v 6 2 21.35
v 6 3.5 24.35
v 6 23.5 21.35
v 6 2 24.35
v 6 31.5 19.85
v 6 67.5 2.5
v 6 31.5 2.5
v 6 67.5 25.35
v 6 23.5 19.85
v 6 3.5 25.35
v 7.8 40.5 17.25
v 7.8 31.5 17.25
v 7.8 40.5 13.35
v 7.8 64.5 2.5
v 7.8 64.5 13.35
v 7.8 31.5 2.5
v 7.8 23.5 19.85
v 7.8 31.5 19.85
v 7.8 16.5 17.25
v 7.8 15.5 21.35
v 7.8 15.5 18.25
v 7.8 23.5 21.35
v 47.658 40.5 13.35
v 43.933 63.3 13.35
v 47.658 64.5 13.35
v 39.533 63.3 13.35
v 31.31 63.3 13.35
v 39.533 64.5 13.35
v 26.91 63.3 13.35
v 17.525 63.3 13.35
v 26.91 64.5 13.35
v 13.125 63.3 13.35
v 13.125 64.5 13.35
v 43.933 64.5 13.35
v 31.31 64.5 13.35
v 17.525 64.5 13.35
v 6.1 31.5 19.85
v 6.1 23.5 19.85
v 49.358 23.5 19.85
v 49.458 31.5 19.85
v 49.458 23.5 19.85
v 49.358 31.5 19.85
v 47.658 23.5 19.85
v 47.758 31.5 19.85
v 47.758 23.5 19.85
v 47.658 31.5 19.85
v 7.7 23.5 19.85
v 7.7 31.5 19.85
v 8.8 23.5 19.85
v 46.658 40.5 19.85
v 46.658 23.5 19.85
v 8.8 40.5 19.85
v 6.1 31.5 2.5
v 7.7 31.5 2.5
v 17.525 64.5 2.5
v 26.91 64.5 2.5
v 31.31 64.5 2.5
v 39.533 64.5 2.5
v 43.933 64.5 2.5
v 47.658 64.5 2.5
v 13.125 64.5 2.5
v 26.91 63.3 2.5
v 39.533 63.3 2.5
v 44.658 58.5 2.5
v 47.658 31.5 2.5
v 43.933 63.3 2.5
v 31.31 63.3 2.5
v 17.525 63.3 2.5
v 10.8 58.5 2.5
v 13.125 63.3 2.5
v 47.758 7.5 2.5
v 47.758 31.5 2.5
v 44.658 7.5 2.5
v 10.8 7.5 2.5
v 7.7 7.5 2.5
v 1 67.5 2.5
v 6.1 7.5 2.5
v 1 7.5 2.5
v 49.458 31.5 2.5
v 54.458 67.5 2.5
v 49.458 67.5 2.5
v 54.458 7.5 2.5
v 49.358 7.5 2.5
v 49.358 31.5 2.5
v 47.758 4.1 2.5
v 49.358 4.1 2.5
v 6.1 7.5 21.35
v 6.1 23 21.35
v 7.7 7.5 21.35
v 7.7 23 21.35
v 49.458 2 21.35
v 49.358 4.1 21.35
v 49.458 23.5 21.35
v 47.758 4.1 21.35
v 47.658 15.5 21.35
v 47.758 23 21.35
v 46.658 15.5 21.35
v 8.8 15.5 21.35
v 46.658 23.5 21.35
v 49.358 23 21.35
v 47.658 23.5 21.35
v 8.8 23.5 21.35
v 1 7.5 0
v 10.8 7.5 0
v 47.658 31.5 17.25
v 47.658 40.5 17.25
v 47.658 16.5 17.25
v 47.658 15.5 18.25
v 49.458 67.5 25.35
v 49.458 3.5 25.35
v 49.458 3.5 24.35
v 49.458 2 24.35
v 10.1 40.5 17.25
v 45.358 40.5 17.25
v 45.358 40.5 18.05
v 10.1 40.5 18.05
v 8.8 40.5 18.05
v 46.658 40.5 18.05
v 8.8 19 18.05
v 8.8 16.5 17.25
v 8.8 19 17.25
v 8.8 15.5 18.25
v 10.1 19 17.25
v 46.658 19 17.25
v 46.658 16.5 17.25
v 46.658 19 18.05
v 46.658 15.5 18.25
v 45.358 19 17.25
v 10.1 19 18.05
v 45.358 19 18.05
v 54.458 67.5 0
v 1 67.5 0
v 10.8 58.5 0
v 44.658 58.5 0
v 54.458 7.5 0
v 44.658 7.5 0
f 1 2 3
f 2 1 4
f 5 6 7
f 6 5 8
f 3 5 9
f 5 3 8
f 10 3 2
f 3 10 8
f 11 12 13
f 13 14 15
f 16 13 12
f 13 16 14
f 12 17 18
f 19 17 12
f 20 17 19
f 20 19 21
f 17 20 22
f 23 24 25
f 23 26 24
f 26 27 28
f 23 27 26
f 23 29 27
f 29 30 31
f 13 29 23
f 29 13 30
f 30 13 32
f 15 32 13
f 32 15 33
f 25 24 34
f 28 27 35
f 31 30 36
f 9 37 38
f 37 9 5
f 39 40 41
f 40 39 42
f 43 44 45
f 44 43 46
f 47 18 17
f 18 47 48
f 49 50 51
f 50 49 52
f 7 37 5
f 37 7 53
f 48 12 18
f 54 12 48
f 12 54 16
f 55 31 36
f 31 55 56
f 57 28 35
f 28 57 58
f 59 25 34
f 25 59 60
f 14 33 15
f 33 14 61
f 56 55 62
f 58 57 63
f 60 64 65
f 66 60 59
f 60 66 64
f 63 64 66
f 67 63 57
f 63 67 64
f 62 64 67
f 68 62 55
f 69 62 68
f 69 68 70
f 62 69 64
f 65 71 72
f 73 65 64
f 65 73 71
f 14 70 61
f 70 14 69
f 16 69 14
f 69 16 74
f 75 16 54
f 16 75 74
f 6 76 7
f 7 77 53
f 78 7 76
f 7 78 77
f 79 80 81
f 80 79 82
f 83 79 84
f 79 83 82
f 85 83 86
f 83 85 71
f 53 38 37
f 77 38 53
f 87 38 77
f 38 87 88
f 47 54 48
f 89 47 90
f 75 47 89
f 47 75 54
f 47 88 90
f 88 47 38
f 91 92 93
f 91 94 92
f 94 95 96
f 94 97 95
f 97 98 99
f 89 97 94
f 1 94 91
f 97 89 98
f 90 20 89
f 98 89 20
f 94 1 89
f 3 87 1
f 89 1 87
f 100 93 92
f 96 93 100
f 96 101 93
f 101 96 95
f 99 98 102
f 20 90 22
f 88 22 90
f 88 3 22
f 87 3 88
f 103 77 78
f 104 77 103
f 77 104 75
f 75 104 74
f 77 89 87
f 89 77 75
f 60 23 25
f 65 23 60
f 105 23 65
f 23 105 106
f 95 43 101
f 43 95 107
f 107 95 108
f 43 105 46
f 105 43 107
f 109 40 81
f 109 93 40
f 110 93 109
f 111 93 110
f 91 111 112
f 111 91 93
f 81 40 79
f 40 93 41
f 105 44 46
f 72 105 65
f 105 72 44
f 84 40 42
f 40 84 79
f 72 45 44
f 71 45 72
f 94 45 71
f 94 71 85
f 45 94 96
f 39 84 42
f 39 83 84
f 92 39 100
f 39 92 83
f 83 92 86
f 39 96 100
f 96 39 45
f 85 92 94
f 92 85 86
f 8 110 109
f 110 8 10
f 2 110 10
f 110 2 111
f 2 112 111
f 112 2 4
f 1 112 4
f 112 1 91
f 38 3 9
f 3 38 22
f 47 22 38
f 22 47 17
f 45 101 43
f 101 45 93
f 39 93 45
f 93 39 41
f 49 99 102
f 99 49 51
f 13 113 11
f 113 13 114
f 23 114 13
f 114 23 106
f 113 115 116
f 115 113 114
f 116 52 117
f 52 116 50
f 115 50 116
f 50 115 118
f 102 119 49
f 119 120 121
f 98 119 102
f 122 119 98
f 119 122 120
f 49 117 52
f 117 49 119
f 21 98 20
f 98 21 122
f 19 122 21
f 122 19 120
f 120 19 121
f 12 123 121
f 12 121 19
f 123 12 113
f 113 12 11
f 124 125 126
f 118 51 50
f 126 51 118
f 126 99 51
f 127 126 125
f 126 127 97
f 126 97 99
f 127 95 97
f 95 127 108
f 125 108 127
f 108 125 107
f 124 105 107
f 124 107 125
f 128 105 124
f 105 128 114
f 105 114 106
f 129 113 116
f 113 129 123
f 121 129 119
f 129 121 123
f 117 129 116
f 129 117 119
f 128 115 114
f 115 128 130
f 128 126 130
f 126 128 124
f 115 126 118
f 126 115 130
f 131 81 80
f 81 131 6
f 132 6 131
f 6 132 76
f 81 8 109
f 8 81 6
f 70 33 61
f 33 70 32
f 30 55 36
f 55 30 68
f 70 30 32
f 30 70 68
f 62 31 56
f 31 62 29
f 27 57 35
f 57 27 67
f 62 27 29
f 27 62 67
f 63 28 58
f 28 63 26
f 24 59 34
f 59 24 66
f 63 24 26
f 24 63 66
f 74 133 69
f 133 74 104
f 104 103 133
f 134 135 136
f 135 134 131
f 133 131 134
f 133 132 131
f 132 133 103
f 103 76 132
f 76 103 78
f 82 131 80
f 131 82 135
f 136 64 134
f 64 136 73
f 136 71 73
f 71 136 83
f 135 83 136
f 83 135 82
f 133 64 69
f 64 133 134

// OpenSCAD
// Toccata stage-0 C11a - 윗판 브리지 출력 쿠폰 (핀 사이 39.86, 모델 프레임 그대로 z50 위) (generated by make_stage0.py; print orientation, z = build direction)
$fn = 64;
union(){
intersection(){translate([6.0000,0,0]) rotate([90,0,90]) linear_extrude(height=1.8000) polygon([[31.5000,-42.5000],[64.5000,-42.5000],[64.5000,13.3500],[64.0000,13.3500],[63.5000,13.3500],[63.0000,13.3500],[62.5000,13.3500],[62.0000,13.3500],[61.5000,13.3500],[61.0000,13.3500],[60.5000,13.3500],[60.0000,13.3500],[59.5000,13.3500],[59.0000,13.3500],[58.5000,13.3500],[58.0000,13.3500],[57.5000,13.3500],[57.0000,13.3500],[56.5000,13.3500],[56.0000,13.3500],[55.5000,13.3500],[55.0000,13.3500],[54.5000,13.3500],[54.0000,13.3500],[53.5000,13.3500],[53.0000,13.3500],[52.5000,13.3500],[52.0000,13.3500],[51.5000,13.3500],[51.0000,13.3500],[50.5000,13.3500],[50.0000,13.3500],[49.5000,13.3500],[49.0000,13.3500],[48.5000,13.3500],[48.0000,13.3500],[47.5000,13.3500],[47.0000,13.3500],[46.5000,13.3500],[46.0000,13.3500],[45.5000,13.3500],[45.0000,13.3500],[44.5000,13.3500],[44.0000,13.3500],[43.5000,13.3500],[43.0000,13.3500],[42.5000,13.3500],[42.0000,13.3500],[41.5000,13.3500],[41.0000,13.3500],[40.5000,19.8500],[40.0000,19.8500],[39.5000,19.8500],[39.0000,19.8500],[38.5000,19.8500],[38.0000,19.8500],[37.5000,19.8500],[37.0000,19.8500],[36.5000,19.8500],[36.0000,19.8500],[35.5000,19.8500],[35.0000,19.8500],[34.5000,19.8500],[34.0000,19.8500],[33.5000,19.8500],[33.0000,19.8500],[32.5000,19.8500],[32.0000,19.8500],[31.5000,19.8500]]); translate([-10,-10,2.5000]) cube([400,400,200]);}
intersection(){translate([6.1000,0,0]) rotate([90,0,90]) linear_extrude(height=1.6000) polygon([[7.5000,-42.5000],[31.5000,-42.5000],[31.5000,19.8500],[31.0000,19.8500],[30.5000,19.8500],[30.0000,19.8500],[29.5000,19.8500],[29.0000,19.8500],[28.5000,19.8500],[28.0000,19.8500],[27.5000,19.8500],[27.0000,19.8500],[26.5000,19.8500],[26.0000,19.8500],[25.5000,19.8500],[25.0000,19.8500],[24.5000,19.8500],[24.0000,19.8500],[23.5000,19.8500],[23.0000,21.3500],[22.5000,21.3500],[22.0000,21.3500],[21.5000,21.3500],[21.0000,21.3500],[20.5000,21.3500],[20.0000,21.3500],[19.5000,21.3500],[19.0000,21.3500],[18.5000,21.3500],[18.0000,21.3500],[17.5000,21.3500],[17.0000,21.3500],[16.5000,21.3500],[16.0000,21.3500],[15.5000,21.3500],[15.0000,21.3500],[14.5000,21.3500],[14.0000,21.3500],[13.5000,21.3500],[13.0000,21.3500],[12.5000,21.3500],[12.0000,21.3500],[11.5000,21.3500],[11.0000,21.3500],[10.5000,21.3500],[10.0000,21.3500],[9.5000,21.3500],[9.0000,21.3500],[8.5000,21.3500],[8.0000,21.3500],[7.5000,21.3500]]); translate([-10,-10,2.5000]) cube([400,400,200]);}
intersection(){translate([47.6580,0,0]) rotate([90,0,90]) linear_extrude(height=1.8000) polygon([[31.5000,-26.0000],[64.5000,-26.0000],[64.5000,13.3500],[64.0000,13.3500],[63.5000,13.3500],[63.0000,13.3500],[62.5000,13.3500],[62.0000,13.3500],[61.5000,13.3500],[61.0000,13.3500],[60.5000,13.3500],[60.0000,13.3500],[59.5000,13.3500],[59.0000,13.3500],[58.5000,13.3500],[58.0000,13.3500],[57.5000,13.3500],[57.0000,13.3500],[56.5000,13.3500],[56.0000,13.3500],[55.5000,13.3500],[55.0000,13.3500],[54.5000,13.3500],[54.0000,13.3500],[53.5000,13.3500],[53.0000,13.3500],[52.5000,13.3500],[52.0000,13.3500],[51.5000,13.3500],[51.0000,13.3500],[50.5000,13.3500],[50.0000,13.3500],[49.5000,13.3500],[49.0000,13.3500],[48.5000,13.3500],[48.0000,13.3500],[47.5000,13.3500],[47.0000,13.3500],[46.5000,13.3500],[46.0000,13.3500],[45.5000,13.3500],[45.0000,13.3500],[44.5000,13.3500],[44.0000,13.3500],[43.5000,13.3500],[43.0000,13.3500],[42.5000,13.3500],[42.0000,13.3500],[41.5000,13.3500],[41.0000,13.3500],[40.5000,19.8500],[40.0000,19.8500],[39.5000,19.8500],[39.0000,19.8500],[38.5000,19.8500],[38.0000,19.8500],[37.5000,19.8500],[37.0000,19.8500],[36.5000,19.8500],[36.0000,19.8500],[35.5000,19.8500],[35.0000,19.8500],[34.5000,19.8500],[34.0000,19.8500],[33.5000,19.8500],[33.0000,19.8500],[32.5000,19.8500],[32.0000,19.8500],[31.5000,19.8500]]); translate([-10,-10,2.5000]) cube([400,400,200]);}
intersection(){translate([47.7580,0,0]) rotate([90,0,90]) linear_extrude(height=1.6000) polygon([[4.1000,-44.5000],[26.2000,-44.5000],[26.2000,-26.0000],[31.5000,-26.0000],[31.5000,19.8500],[31.0000,19.8500],[30.5000,19.8500],[30.0000,19.8500],[29.5000,19.8500],[29.0000,19.8500],[28.5000,19.8500],[28.0000,19.8500],[27.5000,19.8500],[27.0000,19.8500],[26.5000,19.8500],[26.0000,19.8500],[25.5000,19.8500],[25.0000,19.8500],[24.5000,19.8500],[24.0000,19.8500],[23.5000,19.8500],[23.0000,21.3500],[22.5000,21.3500],[22.0000,21.3500],[21.5000,21.3500],[21.0000,21.3500],[20.5000,21.3500],[20.0000,21.3500],[19.5000,21.3500],[19.0000,21.3500],[18.5000,21.3500],[18.0000,21.3500],[17.5000,21.3500],[17.0000,21.3500],[16.5000,21.3500],[16.0000,21.3500],[15.5000,21.3500],[15.0000,21.3500],[14.5000,21.3500],[14.0000,21.3500],[13.5000,21.3500],[13.0000,21.3500],[12.5000,21.3500],[12.0000,21.3500],[11.5000,21.3500],[11.0000,21.3500],[10.5000,21.3500],[10.0000,21.3500],[9.5000,21.3500],[9.0000,21.3500],[8.5000,21.3500],[8.0000,21.3500],[7.5000,21.3500],[7.0000,21.3500],[6.5000,21.3500],[6.0000,21.3500],[5.5000,21.3500],[5.0000,21.3500],[4.5000,21.3500],[4.1000,21.3500]]); translate([-10,-10,2.5000]) cube([400,400,200]);}
intersection(){translate([6.0000,0,0]) rotate([90,0,90]) linear_extrude(height=43.4580) polygon([[2.0000,21.3500],[2.0000,24.3500],[3.5000,24.3500],[3.5000,25.3500],[64.5000,25.3500],[64.5000,13.3500],[64.0000,13.3500],[63.5000,13.3500],[63.0000,13.3500],[62.5000,13.3500],[62.0000,13.3500],[61.5000,13.3500],[61.0000,13.3500],[60.5000,13.3500],[60.0000,13.3500],[59.5000,13.3500],[59.0000,13.3500],[58.5000,13.3500],[58.0000,13.3500],[57.5000,13.3500],[57.0000,13.3500],[56.5000,13.3500],[56.0000,13.3500],[55.5000,13.3500],[55.0000,13.3500],[54.5000,13.3500],[54.0000,13.3500],[53.5000,13.3500],[53.0000,13.3500],[52.5000,13.3500],[52.0000,13.3500],[51.5000,13.3500],[51.0000,13.3500],[50.5000,13.3500],[50.0000,13.3500],[49.5000,13.3500],[49.0000,13.3500],[48.5000,13.3500],[48.0000,13.3500],[47.5000,13.3500],[47.0000,13.3500],[46.5000,13.3500],[46.0000,13.3500],[45.5000,13.3500],[45.0000,13.3500],[44.5000,13.3500],[44.0000,13.3500],[43.5000,13.3500],[43.0000,13.3500],[42.5000,13.3500],[42.0000,13.3500],[41.5000,13.3500],[41.0000,13.3500],[40.5000,13.3500],[40.5000,19.8500],[40.0000,19.8500],[39.5000,19.8500],[39.0000,19.8500],[38.5000,19.8500],[38.0000,19.8500],[37.5000,19.8500],[37.0000,19.8500],[36.5000,19.8500],[36.0000,19.8500],[35.5000,19.8500],[35.0000,19.8500],[34.5000,19.8500],[34.0000,19.8500],[33.5000,19.8500],[33.0000,19.8500],[32.5000,19.8500],[32.0000,19.8500],[31.5000,19.8500],[31.0000,19.8500],[30.5000,19.8500],[30.0000,19.8500],[29.5000,19.8500],[29.0000,19.8500],[28.5000,19.8500],[28.0000,19.8500],[27.5000,19.8500],[27.0000,19.8500],[26.5000,19.8500],[26.0000,19.8500],[25.5000,19.8500],[25.0000,19.8500],[24.5000,19.8500],[24.0000,19.8500],[23.5000,19.8500],[23.5000,21.3500],[23.0000,21.3500],[22.5000,21.3500],[22.0000,21.3500],[21.5000,21.3500],[21.0000,21.3500],[20.5000,21.3500],[20.0000,21.3500],[19.5000,21.3500],[19.0000,21.3500],[18.5000,21.3500],[18.0000,21.3500],[17.5000,21.3500],[17.0000,21.3500],[16.5000,21.3500],[16.0000,21.3500],[15.5000,21.3500],[15.0000,21.3500],[14.5000,21.3500],[14.0000,21.3500],[13.5000,21.3500],[13.0000,21.3500],[12.5000,21.3500],[12.0000,21.3500],[11.5000,21.3500],[11.0000,21.3500],[10.5000,21.3500],[10.0000,21.3500],[9.5000,21.3500],[9.0000,21.3500],[8.5000,21.3500],[8.0000,21.3500],[7.5000,21.3500],[7.0000,21.3500],[6.5000,21.3500],[6.0000,21.3500],[5.5000,21.3500],[5.0000,21.3500],[4.5000,21.3500],[4.0000,21.3500],[3.5000,21.3500],[3.0000,21.3500],[2.5000,21.3500],[2.0000,21.3500]]); translate([-10,-10,2.5000]) cube([400,400,200]);}
intersection(){translate([7.8000,0,0]) rotate([90,0,90]) linear_extrude(height=1.0000) polygon([[16.5000,17.2500],[40.5000,17.2500],[40.5000,19.8500],[23.5000,19.8500],[23.5000,21.3500],[15.5000,21.3500],[15.5000,18.2500]]); translate([-10,-10,2.5000]) cube([400,400,200]);}
intersection(){translate([46.6580,0,0]) rotate([90,0,90]) linear_extrude(height=1.0000) polygon([[16.5000,17.2500],[40.5000,17.2500],[40.5000,19.8500],[23.5000,19.8500],[23.5000,21.3500],[15.5000,21.3500],[15.5000,18.2500]]); translate([-10,-10,2.5000]) cube([400,400,200]);}
intersection(){translate([8.8000,0,0]) rotate([90,0,90]) linear_extrude(height=1.3000) polygon([[19.0000,17.2500],[40.5000,17.2500],[40.5000,18.0500],[19.0000,18.0500]]); translate([-10,-10,2.5000]) cube([400,400,200]);}
intersection(){translate([45.3580,0,0]) rotate([90,0,90]) linear_extrude(height=1.3000) polygon([[19.0000,17.2500],[40.5000,17.2500],[40.5000,18.0500],[19.0000,18.0500]]); translate([-10,-10,2.5000]) cube([400,400,200]);}
intersection(){translate([6.0000,0,0]) rotate([90,0,90]) linear_extrude(height=33.2400) polygon([[64.5000,-42.5000],[67.5000,-42.5000],[67.5000,25.3500],[64.5000,25.3500]]); translate([-10,-10,2.5000]) cube([400,400,200]);}
intersection(){translate([39.2400,0,0]) rotate([90,0,90]) linear_extrude(height=10.2180) polygon([[64.5000,-26.5000],[67.5000,-26.5000],[67.5000,25.3500],[64.5000,25.3500]]); translate([-10,-10,2.5000]) cube([400,400,200]);}
intersection(){translate([13.1250,0,0]) rotate([90,0,90]) linear_extrude(height=4.4000) polygon([[63.3000,-0.5000],[64.5000,-0.5000],[64.5000,13.3500],[63.3000,13.3500]]); translate([-10,-10,2.5000]) cube([400,400,200]);}
intersection(){translate([26.9100,0,0]) rotate([90,0,90]) linear_extrude(height=4.4000) polygon([[63.3000,-0.5000],[64.5000,-0.5000],[64.5000,13.3500],[63.3000,13.3500]]); translate([-10,-10,2.5000]) cube([400,400,200]);}
intersection(){translate([39.5330,0,0]) rotate([90,0,90]) linear_extrude(height=4.4000) polygon([[63.3000,-0.5000],[64.5000,-0.5000],[64.5000,13.3500],[63.3000,13.3500]]); translate([-10,-10,2.5000]) cube([400,400,200]);}
translate([1.0000,7.5000,0.0000]) cube([9.8000,60.0000,2.5000]);
translate([44.6580,7.5000,0.0000]) cube([9.8000,60.0000,2.5000]);
translate([1.0000,58.5000,0.0000]) cube([53.4580,9.0000,2.5000]);
}
